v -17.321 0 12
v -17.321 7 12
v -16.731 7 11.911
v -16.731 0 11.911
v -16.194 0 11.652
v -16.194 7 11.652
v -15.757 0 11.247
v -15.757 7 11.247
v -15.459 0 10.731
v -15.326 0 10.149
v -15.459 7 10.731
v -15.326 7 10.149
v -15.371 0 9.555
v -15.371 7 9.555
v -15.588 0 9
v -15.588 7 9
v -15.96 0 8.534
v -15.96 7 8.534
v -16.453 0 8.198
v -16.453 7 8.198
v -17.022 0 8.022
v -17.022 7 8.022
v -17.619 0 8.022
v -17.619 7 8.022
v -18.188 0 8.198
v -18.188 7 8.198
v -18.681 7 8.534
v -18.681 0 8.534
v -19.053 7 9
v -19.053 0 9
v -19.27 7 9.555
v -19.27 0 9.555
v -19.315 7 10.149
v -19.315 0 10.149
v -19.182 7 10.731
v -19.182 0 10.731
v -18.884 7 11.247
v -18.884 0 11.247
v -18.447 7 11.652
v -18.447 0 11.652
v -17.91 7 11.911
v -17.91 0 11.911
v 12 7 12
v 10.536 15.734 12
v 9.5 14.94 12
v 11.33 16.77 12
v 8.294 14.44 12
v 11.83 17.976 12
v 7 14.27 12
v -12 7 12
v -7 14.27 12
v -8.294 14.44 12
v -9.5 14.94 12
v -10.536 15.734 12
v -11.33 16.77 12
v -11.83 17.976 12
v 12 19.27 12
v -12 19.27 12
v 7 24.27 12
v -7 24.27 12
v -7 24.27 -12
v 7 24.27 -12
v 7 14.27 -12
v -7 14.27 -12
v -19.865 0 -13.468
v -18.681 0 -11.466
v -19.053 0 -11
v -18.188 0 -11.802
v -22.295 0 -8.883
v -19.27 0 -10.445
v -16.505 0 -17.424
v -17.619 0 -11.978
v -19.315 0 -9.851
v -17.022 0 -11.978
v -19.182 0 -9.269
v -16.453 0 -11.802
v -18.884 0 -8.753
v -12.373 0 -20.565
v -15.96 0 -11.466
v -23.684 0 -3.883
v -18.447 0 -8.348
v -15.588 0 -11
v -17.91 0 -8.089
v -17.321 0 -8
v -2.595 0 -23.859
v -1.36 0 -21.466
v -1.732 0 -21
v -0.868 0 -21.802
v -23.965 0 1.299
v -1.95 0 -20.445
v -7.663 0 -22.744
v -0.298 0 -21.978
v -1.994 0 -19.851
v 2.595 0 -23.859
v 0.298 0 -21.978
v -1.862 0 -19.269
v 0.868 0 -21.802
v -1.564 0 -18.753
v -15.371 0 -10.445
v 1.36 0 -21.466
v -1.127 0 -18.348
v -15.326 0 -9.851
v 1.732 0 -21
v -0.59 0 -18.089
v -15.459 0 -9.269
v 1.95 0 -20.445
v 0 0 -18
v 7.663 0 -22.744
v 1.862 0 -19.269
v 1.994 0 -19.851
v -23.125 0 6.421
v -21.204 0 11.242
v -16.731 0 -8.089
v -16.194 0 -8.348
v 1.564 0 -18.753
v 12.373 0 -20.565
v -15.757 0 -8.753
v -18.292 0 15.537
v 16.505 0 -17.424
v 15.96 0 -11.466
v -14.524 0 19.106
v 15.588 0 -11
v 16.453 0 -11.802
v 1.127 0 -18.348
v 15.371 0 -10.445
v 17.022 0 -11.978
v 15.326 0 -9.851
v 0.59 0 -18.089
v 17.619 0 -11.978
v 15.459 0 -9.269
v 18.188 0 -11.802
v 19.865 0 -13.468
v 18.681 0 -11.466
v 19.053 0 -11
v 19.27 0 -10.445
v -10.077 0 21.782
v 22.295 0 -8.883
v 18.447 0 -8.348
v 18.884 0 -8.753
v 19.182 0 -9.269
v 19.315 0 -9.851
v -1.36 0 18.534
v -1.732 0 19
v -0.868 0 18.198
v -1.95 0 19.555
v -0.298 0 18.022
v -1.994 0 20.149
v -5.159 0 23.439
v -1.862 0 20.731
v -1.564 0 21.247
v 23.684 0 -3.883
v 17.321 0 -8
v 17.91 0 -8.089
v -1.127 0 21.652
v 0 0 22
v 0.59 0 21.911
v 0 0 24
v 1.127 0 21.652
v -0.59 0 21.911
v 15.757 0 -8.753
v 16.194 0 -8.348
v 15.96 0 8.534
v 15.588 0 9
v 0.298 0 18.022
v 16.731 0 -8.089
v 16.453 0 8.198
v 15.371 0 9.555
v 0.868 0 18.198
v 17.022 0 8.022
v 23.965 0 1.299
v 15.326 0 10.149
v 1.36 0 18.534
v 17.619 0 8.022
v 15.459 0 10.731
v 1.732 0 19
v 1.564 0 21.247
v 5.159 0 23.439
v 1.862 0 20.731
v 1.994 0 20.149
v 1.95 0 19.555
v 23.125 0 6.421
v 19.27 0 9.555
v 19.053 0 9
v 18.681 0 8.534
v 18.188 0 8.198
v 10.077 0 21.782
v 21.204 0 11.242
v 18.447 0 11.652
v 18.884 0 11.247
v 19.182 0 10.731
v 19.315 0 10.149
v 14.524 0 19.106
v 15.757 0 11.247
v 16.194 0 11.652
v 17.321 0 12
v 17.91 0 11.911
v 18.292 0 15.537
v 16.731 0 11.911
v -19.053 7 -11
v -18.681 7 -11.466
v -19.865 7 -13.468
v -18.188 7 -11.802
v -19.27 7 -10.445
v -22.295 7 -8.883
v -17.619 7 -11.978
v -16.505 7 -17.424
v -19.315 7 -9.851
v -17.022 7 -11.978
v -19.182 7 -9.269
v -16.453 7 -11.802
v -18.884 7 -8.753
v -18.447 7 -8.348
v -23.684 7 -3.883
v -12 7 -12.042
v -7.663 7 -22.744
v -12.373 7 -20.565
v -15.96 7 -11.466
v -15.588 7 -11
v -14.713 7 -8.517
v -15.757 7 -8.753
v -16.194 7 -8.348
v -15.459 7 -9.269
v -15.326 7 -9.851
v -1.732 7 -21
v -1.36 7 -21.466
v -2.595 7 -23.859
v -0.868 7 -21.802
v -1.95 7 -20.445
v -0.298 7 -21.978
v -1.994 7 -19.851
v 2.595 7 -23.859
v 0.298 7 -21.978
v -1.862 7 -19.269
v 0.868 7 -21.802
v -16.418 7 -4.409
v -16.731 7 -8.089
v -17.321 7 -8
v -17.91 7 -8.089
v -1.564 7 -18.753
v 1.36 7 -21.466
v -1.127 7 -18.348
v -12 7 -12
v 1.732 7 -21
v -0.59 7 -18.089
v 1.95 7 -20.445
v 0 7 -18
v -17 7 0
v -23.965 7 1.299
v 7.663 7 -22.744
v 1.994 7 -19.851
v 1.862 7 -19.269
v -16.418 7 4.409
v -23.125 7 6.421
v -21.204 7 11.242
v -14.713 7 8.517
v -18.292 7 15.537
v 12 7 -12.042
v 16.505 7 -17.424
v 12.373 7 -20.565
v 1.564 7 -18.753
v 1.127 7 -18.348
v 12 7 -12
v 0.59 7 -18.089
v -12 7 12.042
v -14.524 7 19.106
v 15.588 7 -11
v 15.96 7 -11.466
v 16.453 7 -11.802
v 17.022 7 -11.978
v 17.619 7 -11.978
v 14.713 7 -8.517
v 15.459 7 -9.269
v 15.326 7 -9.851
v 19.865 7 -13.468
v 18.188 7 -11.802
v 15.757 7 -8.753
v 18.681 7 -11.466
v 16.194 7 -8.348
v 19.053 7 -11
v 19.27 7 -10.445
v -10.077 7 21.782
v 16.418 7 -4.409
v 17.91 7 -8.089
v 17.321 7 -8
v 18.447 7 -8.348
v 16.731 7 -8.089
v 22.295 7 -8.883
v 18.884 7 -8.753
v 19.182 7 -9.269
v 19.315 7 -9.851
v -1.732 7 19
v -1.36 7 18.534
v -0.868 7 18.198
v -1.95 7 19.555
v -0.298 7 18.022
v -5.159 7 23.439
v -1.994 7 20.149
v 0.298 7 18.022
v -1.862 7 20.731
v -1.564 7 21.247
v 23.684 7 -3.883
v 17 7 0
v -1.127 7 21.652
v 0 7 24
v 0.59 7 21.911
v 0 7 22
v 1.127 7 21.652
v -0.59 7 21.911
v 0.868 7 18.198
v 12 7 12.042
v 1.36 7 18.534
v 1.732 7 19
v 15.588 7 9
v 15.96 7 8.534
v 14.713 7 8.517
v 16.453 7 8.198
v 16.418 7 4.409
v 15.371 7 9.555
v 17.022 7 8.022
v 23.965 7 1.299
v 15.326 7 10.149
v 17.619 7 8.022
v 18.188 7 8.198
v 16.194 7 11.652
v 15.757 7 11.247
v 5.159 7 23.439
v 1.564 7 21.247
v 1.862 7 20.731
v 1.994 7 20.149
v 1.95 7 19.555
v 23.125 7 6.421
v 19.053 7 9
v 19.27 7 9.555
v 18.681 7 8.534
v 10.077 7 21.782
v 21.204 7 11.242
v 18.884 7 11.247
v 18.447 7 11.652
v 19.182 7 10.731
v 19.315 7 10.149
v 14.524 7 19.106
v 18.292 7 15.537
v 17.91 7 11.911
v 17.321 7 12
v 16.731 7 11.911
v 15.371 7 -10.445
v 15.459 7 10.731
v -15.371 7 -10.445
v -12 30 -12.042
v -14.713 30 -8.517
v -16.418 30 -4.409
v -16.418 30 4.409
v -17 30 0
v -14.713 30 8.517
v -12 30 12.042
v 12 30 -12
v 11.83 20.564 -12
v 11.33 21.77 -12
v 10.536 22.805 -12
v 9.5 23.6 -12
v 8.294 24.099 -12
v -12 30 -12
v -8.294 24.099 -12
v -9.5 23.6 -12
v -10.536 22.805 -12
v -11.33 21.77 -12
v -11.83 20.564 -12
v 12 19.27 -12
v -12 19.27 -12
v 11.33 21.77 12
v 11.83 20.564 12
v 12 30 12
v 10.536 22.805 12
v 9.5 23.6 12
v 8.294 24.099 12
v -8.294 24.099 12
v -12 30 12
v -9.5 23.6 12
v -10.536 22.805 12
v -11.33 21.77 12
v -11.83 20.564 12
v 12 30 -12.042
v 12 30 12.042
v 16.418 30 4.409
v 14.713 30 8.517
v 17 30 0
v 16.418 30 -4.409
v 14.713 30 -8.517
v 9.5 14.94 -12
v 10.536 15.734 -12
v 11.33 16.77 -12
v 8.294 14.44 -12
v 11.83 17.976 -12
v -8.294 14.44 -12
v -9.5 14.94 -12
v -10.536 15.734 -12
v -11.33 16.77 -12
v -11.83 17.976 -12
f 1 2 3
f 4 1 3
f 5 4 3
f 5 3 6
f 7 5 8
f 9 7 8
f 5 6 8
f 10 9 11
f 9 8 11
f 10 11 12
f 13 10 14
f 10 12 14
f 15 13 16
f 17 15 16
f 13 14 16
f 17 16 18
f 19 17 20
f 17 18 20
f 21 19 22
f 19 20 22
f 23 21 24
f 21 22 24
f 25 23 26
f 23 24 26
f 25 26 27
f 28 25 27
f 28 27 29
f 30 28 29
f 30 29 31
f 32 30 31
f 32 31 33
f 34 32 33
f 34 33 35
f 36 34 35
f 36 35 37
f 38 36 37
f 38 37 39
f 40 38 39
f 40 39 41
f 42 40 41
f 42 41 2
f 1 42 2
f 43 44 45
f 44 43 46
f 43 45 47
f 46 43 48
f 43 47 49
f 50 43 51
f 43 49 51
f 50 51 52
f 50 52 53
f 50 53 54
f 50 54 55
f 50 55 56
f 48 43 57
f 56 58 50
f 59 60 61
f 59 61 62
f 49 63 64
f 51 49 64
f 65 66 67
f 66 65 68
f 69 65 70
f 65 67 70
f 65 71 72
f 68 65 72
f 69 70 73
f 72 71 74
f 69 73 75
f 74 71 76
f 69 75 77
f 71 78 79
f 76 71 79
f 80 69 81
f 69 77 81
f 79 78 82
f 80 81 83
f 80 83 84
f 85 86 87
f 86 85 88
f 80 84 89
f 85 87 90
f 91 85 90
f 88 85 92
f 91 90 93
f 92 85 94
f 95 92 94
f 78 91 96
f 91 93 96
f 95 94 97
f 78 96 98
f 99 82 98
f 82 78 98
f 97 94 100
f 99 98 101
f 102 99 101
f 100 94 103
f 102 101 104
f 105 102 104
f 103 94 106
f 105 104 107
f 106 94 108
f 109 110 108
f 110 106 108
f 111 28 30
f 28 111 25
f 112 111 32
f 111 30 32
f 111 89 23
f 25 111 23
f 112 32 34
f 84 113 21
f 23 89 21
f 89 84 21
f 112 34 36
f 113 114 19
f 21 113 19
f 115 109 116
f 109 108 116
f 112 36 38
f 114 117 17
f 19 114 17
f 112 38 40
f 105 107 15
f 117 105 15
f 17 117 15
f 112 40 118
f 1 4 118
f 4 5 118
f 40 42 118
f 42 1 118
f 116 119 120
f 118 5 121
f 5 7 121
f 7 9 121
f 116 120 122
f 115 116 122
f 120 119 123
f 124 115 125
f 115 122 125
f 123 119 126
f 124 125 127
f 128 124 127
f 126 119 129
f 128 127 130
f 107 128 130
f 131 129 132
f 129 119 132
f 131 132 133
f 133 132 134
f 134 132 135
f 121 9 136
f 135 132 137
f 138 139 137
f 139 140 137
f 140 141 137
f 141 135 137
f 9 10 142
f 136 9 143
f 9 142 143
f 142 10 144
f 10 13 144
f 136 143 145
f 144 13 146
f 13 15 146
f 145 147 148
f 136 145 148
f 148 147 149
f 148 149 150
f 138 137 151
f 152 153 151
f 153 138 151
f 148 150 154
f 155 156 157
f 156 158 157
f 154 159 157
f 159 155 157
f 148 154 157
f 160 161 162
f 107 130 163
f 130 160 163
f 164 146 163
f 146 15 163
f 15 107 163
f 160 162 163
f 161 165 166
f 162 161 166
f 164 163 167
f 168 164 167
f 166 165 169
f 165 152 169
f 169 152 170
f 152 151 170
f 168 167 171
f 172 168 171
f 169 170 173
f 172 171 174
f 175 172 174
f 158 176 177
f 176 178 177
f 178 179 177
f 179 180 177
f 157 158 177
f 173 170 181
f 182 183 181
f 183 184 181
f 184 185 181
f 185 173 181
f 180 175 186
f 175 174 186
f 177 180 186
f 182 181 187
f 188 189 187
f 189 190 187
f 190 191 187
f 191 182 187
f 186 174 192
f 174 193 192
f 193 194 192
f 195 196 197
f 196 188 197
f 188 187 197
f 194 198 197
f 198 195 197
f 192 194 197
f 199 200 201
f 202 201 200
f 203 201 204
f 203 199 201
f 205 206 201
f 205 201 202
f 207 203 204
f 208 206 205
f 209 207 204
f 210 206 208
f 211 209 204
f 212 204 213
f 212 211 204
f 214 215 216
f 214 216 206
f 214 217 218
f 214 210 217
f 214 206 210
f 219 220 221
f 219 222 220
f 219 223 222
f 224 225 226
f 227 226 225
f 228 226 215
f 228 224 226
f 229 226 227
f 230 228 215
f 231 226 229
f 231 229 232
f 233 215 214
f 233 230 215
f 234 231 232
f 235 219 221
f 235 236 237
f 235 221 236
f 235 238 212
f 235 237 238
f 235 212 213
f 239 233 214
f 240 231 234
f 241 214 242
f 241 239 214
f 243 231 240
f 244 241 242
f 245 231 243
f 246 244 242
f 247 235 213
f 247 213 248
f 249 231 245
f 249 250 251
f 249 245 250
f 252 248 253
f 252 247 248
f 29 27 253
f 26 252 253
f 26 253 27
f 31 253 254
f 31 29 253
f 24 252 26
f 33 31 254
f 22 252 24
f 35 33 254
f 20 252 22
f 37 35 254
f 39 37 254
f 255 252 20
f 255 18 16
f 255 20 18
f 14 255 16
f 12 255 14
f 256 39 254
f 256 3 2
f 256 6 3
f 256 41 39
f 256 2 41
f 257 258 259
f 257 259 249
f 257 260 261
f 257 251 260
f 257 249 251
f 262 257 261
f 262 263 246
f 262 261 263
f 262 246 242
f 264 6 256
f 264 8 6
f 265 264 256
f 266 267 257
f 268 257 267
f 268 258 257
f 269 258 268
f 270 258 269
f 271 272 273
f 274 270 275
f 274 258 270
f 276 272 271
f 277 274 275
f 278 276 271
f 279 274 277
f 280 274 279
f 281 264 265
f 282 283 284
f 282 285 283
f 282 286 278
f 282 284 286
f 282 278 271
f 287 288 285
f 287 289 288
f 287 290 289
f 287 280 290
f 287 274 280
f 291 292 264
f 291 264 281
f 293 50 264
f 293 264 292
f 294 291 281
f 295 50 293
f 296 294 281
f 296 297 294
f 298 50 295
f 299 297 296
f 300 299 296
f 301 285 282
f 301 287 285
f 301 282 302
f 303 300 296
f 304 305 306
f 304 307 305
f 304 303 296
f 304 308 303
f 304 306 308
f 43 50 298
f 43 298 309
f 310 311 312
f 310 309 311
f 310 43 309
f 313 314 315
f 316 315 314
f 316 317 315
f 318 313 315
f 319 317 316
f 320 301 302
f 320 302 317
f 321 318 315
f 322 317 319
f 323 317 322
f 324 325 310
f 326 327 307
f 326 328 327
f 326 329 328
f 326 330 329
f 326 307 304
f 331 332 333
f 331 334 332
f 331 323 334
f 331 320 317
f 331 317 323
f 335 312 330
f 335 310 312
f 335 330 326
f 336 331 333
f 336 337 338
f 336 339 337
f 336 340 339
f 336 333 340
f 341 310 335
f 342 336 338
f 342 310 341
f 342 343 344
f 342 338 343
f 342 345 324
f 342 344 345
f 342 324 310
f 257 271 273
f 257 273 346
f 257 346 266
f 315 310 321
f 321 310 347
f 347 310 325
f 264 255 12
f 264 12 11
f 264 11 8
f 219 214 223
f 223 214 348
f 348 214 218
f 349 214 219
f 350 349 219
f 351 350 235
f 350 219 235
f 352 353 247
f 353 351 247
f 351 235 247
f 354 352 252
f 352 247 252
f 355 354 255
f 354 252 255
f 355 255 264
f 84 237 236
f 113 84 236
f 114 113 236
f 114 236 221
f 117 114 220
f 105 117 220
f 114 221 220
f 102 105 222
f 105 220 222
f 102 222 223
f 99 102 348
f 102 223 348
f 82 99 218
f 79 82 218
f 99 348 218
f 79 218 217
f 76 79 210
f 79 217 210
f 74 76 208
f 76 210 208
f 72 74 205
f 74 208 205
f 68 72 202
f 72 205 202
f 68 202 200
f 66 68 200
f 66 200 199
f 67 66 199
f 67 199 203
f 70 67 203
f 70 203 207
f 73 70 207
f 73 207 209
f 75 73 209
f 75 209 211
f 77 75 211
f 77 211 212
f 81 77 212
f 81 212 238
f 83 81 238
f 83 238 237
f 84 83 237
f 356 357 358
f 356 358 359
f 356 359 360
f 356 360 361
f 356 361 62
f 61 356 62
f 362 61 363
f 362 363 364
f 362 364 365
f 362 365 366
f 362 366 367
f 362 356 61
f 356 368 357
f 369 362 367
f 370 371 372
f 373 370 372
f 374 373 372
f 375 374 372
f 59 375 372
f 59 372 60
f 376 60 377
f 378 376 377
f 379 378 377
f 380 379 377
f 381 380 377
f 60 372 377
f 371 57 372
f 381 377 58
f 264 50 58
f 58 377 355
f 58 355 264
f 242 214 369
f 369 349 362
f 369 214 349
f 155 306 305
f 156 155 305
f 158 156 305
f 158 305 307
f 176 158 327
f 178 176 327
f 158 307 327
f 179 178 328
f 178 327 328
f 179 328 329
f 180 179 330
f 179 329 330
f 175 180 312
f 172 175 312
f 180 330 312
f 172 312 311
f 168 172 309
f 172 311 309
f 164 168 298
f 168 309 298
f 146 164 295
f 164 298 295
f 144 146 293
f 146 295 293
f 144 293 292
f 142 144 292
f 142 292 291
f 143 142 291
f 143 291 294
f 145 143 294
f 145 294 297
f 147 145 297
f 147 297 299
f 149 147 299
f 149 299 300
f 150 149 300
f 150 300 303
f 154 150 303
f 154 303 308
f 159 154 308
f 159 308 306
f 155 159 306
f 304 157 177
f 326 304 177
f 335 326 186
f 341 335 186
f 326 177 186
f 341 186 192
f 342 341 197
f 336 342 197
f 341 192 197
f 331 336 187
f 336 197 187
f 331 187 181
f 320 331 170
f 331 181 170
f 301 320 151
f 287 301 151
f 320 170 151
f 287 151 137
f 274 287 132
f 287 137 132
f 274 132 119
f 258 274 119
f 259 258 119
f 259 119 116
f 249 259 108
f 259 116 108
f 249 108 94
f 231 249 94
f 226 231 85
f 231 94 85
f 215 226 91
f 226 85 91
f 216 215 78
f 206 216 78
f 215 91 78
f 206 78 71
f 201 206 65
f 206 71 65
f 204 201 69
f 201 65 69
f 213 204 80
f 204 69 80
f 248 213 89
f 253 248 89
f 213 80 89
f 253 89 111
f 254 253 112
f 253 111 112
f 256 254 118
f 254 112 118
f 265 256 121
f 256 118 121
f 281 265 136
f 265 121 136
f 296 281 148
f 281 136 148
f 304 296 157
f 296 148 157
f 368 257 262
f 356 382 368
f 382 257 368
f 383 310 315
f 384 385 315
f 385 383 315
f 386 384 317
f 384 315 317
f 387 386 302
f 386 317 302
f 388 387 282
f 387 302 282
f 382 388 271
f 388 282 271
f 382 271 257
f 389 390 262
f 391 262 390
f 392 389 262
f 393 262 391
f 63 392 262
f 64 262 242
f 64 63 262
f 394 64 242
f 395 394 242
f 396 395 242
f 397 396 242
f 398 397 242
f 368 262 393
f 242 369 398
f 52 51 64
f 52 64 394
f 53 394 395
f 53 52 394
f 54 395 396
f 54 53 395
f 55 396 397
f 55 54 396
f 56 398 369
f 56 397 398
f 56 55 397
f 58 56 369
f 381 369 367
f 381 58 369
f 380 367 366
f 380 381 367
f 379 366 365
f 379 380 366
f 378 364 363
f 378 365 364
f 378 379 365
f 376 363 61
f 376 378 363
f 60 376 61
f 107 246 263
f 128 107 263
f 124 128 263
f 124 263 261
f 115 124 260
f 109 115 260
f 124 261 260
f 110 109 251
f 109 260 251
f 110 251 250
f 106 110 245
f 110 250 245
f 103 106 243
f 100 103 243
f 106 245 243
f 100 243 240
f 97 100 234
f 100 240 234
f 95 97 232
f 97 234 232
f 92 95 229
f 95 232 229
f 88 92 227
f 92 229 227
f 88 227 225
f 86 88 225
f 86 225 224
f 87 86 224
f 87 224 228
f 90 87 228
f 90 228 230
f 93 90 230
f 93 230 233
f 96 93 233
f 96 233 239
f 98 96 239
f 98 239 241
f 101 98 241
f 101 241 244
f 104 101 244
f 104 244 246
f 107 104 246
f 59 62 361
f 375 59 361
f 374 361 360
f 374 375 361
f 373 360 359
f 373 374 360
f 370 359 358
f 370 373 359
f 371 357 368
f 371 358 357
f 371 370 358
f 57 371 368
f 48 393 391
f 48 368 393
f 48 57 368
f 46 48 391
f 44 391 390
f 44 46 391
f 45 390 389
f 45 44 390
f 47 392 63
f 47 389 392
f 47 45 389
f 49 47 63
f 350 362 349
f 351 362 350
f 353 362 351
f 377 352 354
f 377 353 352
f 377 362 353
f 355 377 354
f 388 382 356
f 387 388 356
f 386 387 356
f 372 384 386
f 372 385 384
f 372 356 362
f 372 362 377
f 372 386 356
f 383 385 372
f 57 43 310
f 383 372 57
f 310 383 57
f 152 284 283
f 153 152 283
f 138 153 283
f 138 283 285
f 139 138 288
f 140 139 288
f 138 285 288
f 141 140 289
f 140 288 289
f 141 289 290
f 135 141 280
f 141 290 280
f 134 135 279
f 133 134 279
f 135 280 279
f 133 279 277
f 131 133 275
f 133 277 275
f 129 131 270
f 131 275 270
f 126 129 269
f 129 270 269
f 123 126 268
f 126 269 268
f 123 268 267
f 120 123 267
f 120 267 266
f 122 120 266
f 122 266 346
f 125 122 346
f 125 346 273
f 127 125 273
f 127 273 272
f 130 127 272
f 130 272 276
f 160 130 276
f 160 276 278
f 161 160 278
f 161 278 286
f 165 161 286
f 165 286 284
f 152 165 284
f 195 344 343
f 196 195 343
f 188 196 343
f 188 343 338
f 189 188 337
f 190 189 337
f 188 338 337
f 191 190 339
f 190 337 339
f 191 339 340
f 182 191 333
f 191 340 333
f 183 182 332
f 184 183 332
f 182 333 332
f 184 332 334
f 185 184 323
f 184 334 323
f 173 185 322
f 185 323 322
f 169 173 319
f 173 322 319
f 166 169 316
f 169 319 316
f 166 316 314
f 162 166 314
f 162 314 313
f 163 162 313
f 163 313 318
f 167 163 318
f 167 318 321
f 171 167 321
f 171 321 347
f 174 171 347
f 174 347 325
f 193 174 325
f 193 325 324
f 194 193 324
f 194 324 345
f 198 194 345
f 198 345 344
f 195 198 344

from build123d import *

# Parameters (mm, degrees)
SKETCH_1_R          = 24
EXTRUDE_1_DEPTH     = 7
SKETCH_2_R          = 17
EXTRUDE_2_DEPTH     = 23
CUT_EXTRUDE_1_DEPTH = 23
CUT_EXTRUDE_3_REACH = 47.299
SKETCH_4_W          = 24
SKETCH_4_H          = 8.031532799
SKETCH_5_R          = 2
CUT_EXTRUDE_2_DEPTH = 42


with BuildPart() as part:
    # Эскиз1 → Вытянуть1 (new body)
    with BuildSketch(Plane(origin=(0, 0, 0), x_dir=(1, 0, 0), z_dir=(0, 1, 0))):
        with Locations(Location((0, 0, 0), (0, 0, 270))):
            Circle(SKETCH_1_R)
    extrude(amount=EXTRUDE_1_DEPTH)

    # Эскиз2 → Вытянуть2 (add)
    with BuildSketch(Plane(origin=(0, 7, 0), x_dir=(1, 0, 0), z_dir=(0, 1, 0))):
        with Locations(Location((0, 0, 0), (0, 0, 270))):
            Circle(SKETCH_2_R)
    extrude(amount=EXTRUDE_2_DEPTH)

    # Эскиз3 → Вырез-Вытянуть1 (cut, symmetric)
    with BuildSketch(Plane.XY):
        with BuildLine():
            Line((-7, 24.269678179), (7, 24.269678179))
            ThreePointArc((7, 24.269678179), (12, 19.269678179), (7, 14.269678179))
            Line((7, 14.269678179), (-7, 14.269678179))
            ThreePointArc((-7, 14.269678179), (-12, 19.269678179), (-7, 24.269678179))
        make_face()
    extrude(amount=CUT_EXTRUDE_1_DEPTH, both=True, mode=Mode.SUBTRACT)

    # Вытянуть3: up to this face of the body (flat: up to its plane)
    cut_extrude_3_end = Plane(part.part.faces().sort_by_distance((0, 7, -23.32117749))[0])
    # Эскиз4 → Вытянуть3 (cut, up to the picked face)
    with BuildSketch(Plane(origin=(0, 30, 0), x_dir=(-1, 0, 0), z_dir=(0, 1, 0)), mode=Mode.PRIVATE) as cut_extrude_3_sk1:
        with Locations((0, -16.0157664)):
            Rectangle(SKETCH_4_W, SKETCH_4_H)
    cut_extrude_3_tool1 = split(extrude(cut_extrude_3_sk1.sketch, amount=-CUT_EXTRUDE_3_REACH, mode=Mode.PRIVATE), bisect_by=cut_extrude_3_end, keep=Keep.BOTH, mode=Mode.PRIVATE)
    # Эскиз4 → Вытянуть3 (cut, up to the picked face)
    with BuildSketch(Plane(origin=(0, 30, 0), x_dir=(-1, 0, 0), z_dir=(0, 1, 0)), mode=Mode.PRIVATE) as cut_extrude_3_sk2:
        with Locations((0, 16.0157664)):
            Rectangle(SKETCH_4_W, SKETCH_4_H)
    cut_extrude_3_tool2 = split(extrude(cut_extrude_3_sk2.sketch, amount=-CUT_EXTRUDE_3_REACH, mode=Mode.PRIVATE), bisect_by=cut_extrude_3_end, keep=Keep.BOTH, mode=Mode.PRIVATE)
    add(cut_extrude_3_tool1.solids().sort_by(Axis((0, 30, -16.015766), (0, -1, 0)))[0], mode=Mode.SUBTRACT)
    add(cut_extrude_3_tool2.solids().sort_by(Axis((0, 30, 16.015766), (0, -1, 0)))[0], mode=Mode.SUBTRACT)

    # Эскиз5 → Вырез-Вытянуть2 (cut, through all)
    with BuildSketch(Plane(origin=(0, 7, 0), x_dir=(1, 0, 0), z_dir=(0, 1, 0))):
        with Locations(Location((0, 20, 0), (0, 0, 270))):
            Circle(SKETCH_5_R)
        with Locations(Location((17.320508076, 10, 0), (0, 0, 270))):
            Circle(SKETCH_5_R)
        with Locations(Location((17.320508076, -10, 0), (0, 0, 270))):
            Circle(SKETCH_5_R)
        with Locations(Location((0, -20, 0), (0, 0, 270))):
            Circle(SKETCH_5_R)
        with Locations(Location((-17.320508076, -10, 0), (0, 0, 270))):
            Circle(SKETCH_5_R)
        with Locations(Location((-17.320508076, 10, 0), (0, 0, 270))):
            Circle(SKETCH_5_R)
    extrude(amount=-CUT_EXTRUDE_2_DEPTH, mode=Mode.SUBTRACT)


solid = part.part
